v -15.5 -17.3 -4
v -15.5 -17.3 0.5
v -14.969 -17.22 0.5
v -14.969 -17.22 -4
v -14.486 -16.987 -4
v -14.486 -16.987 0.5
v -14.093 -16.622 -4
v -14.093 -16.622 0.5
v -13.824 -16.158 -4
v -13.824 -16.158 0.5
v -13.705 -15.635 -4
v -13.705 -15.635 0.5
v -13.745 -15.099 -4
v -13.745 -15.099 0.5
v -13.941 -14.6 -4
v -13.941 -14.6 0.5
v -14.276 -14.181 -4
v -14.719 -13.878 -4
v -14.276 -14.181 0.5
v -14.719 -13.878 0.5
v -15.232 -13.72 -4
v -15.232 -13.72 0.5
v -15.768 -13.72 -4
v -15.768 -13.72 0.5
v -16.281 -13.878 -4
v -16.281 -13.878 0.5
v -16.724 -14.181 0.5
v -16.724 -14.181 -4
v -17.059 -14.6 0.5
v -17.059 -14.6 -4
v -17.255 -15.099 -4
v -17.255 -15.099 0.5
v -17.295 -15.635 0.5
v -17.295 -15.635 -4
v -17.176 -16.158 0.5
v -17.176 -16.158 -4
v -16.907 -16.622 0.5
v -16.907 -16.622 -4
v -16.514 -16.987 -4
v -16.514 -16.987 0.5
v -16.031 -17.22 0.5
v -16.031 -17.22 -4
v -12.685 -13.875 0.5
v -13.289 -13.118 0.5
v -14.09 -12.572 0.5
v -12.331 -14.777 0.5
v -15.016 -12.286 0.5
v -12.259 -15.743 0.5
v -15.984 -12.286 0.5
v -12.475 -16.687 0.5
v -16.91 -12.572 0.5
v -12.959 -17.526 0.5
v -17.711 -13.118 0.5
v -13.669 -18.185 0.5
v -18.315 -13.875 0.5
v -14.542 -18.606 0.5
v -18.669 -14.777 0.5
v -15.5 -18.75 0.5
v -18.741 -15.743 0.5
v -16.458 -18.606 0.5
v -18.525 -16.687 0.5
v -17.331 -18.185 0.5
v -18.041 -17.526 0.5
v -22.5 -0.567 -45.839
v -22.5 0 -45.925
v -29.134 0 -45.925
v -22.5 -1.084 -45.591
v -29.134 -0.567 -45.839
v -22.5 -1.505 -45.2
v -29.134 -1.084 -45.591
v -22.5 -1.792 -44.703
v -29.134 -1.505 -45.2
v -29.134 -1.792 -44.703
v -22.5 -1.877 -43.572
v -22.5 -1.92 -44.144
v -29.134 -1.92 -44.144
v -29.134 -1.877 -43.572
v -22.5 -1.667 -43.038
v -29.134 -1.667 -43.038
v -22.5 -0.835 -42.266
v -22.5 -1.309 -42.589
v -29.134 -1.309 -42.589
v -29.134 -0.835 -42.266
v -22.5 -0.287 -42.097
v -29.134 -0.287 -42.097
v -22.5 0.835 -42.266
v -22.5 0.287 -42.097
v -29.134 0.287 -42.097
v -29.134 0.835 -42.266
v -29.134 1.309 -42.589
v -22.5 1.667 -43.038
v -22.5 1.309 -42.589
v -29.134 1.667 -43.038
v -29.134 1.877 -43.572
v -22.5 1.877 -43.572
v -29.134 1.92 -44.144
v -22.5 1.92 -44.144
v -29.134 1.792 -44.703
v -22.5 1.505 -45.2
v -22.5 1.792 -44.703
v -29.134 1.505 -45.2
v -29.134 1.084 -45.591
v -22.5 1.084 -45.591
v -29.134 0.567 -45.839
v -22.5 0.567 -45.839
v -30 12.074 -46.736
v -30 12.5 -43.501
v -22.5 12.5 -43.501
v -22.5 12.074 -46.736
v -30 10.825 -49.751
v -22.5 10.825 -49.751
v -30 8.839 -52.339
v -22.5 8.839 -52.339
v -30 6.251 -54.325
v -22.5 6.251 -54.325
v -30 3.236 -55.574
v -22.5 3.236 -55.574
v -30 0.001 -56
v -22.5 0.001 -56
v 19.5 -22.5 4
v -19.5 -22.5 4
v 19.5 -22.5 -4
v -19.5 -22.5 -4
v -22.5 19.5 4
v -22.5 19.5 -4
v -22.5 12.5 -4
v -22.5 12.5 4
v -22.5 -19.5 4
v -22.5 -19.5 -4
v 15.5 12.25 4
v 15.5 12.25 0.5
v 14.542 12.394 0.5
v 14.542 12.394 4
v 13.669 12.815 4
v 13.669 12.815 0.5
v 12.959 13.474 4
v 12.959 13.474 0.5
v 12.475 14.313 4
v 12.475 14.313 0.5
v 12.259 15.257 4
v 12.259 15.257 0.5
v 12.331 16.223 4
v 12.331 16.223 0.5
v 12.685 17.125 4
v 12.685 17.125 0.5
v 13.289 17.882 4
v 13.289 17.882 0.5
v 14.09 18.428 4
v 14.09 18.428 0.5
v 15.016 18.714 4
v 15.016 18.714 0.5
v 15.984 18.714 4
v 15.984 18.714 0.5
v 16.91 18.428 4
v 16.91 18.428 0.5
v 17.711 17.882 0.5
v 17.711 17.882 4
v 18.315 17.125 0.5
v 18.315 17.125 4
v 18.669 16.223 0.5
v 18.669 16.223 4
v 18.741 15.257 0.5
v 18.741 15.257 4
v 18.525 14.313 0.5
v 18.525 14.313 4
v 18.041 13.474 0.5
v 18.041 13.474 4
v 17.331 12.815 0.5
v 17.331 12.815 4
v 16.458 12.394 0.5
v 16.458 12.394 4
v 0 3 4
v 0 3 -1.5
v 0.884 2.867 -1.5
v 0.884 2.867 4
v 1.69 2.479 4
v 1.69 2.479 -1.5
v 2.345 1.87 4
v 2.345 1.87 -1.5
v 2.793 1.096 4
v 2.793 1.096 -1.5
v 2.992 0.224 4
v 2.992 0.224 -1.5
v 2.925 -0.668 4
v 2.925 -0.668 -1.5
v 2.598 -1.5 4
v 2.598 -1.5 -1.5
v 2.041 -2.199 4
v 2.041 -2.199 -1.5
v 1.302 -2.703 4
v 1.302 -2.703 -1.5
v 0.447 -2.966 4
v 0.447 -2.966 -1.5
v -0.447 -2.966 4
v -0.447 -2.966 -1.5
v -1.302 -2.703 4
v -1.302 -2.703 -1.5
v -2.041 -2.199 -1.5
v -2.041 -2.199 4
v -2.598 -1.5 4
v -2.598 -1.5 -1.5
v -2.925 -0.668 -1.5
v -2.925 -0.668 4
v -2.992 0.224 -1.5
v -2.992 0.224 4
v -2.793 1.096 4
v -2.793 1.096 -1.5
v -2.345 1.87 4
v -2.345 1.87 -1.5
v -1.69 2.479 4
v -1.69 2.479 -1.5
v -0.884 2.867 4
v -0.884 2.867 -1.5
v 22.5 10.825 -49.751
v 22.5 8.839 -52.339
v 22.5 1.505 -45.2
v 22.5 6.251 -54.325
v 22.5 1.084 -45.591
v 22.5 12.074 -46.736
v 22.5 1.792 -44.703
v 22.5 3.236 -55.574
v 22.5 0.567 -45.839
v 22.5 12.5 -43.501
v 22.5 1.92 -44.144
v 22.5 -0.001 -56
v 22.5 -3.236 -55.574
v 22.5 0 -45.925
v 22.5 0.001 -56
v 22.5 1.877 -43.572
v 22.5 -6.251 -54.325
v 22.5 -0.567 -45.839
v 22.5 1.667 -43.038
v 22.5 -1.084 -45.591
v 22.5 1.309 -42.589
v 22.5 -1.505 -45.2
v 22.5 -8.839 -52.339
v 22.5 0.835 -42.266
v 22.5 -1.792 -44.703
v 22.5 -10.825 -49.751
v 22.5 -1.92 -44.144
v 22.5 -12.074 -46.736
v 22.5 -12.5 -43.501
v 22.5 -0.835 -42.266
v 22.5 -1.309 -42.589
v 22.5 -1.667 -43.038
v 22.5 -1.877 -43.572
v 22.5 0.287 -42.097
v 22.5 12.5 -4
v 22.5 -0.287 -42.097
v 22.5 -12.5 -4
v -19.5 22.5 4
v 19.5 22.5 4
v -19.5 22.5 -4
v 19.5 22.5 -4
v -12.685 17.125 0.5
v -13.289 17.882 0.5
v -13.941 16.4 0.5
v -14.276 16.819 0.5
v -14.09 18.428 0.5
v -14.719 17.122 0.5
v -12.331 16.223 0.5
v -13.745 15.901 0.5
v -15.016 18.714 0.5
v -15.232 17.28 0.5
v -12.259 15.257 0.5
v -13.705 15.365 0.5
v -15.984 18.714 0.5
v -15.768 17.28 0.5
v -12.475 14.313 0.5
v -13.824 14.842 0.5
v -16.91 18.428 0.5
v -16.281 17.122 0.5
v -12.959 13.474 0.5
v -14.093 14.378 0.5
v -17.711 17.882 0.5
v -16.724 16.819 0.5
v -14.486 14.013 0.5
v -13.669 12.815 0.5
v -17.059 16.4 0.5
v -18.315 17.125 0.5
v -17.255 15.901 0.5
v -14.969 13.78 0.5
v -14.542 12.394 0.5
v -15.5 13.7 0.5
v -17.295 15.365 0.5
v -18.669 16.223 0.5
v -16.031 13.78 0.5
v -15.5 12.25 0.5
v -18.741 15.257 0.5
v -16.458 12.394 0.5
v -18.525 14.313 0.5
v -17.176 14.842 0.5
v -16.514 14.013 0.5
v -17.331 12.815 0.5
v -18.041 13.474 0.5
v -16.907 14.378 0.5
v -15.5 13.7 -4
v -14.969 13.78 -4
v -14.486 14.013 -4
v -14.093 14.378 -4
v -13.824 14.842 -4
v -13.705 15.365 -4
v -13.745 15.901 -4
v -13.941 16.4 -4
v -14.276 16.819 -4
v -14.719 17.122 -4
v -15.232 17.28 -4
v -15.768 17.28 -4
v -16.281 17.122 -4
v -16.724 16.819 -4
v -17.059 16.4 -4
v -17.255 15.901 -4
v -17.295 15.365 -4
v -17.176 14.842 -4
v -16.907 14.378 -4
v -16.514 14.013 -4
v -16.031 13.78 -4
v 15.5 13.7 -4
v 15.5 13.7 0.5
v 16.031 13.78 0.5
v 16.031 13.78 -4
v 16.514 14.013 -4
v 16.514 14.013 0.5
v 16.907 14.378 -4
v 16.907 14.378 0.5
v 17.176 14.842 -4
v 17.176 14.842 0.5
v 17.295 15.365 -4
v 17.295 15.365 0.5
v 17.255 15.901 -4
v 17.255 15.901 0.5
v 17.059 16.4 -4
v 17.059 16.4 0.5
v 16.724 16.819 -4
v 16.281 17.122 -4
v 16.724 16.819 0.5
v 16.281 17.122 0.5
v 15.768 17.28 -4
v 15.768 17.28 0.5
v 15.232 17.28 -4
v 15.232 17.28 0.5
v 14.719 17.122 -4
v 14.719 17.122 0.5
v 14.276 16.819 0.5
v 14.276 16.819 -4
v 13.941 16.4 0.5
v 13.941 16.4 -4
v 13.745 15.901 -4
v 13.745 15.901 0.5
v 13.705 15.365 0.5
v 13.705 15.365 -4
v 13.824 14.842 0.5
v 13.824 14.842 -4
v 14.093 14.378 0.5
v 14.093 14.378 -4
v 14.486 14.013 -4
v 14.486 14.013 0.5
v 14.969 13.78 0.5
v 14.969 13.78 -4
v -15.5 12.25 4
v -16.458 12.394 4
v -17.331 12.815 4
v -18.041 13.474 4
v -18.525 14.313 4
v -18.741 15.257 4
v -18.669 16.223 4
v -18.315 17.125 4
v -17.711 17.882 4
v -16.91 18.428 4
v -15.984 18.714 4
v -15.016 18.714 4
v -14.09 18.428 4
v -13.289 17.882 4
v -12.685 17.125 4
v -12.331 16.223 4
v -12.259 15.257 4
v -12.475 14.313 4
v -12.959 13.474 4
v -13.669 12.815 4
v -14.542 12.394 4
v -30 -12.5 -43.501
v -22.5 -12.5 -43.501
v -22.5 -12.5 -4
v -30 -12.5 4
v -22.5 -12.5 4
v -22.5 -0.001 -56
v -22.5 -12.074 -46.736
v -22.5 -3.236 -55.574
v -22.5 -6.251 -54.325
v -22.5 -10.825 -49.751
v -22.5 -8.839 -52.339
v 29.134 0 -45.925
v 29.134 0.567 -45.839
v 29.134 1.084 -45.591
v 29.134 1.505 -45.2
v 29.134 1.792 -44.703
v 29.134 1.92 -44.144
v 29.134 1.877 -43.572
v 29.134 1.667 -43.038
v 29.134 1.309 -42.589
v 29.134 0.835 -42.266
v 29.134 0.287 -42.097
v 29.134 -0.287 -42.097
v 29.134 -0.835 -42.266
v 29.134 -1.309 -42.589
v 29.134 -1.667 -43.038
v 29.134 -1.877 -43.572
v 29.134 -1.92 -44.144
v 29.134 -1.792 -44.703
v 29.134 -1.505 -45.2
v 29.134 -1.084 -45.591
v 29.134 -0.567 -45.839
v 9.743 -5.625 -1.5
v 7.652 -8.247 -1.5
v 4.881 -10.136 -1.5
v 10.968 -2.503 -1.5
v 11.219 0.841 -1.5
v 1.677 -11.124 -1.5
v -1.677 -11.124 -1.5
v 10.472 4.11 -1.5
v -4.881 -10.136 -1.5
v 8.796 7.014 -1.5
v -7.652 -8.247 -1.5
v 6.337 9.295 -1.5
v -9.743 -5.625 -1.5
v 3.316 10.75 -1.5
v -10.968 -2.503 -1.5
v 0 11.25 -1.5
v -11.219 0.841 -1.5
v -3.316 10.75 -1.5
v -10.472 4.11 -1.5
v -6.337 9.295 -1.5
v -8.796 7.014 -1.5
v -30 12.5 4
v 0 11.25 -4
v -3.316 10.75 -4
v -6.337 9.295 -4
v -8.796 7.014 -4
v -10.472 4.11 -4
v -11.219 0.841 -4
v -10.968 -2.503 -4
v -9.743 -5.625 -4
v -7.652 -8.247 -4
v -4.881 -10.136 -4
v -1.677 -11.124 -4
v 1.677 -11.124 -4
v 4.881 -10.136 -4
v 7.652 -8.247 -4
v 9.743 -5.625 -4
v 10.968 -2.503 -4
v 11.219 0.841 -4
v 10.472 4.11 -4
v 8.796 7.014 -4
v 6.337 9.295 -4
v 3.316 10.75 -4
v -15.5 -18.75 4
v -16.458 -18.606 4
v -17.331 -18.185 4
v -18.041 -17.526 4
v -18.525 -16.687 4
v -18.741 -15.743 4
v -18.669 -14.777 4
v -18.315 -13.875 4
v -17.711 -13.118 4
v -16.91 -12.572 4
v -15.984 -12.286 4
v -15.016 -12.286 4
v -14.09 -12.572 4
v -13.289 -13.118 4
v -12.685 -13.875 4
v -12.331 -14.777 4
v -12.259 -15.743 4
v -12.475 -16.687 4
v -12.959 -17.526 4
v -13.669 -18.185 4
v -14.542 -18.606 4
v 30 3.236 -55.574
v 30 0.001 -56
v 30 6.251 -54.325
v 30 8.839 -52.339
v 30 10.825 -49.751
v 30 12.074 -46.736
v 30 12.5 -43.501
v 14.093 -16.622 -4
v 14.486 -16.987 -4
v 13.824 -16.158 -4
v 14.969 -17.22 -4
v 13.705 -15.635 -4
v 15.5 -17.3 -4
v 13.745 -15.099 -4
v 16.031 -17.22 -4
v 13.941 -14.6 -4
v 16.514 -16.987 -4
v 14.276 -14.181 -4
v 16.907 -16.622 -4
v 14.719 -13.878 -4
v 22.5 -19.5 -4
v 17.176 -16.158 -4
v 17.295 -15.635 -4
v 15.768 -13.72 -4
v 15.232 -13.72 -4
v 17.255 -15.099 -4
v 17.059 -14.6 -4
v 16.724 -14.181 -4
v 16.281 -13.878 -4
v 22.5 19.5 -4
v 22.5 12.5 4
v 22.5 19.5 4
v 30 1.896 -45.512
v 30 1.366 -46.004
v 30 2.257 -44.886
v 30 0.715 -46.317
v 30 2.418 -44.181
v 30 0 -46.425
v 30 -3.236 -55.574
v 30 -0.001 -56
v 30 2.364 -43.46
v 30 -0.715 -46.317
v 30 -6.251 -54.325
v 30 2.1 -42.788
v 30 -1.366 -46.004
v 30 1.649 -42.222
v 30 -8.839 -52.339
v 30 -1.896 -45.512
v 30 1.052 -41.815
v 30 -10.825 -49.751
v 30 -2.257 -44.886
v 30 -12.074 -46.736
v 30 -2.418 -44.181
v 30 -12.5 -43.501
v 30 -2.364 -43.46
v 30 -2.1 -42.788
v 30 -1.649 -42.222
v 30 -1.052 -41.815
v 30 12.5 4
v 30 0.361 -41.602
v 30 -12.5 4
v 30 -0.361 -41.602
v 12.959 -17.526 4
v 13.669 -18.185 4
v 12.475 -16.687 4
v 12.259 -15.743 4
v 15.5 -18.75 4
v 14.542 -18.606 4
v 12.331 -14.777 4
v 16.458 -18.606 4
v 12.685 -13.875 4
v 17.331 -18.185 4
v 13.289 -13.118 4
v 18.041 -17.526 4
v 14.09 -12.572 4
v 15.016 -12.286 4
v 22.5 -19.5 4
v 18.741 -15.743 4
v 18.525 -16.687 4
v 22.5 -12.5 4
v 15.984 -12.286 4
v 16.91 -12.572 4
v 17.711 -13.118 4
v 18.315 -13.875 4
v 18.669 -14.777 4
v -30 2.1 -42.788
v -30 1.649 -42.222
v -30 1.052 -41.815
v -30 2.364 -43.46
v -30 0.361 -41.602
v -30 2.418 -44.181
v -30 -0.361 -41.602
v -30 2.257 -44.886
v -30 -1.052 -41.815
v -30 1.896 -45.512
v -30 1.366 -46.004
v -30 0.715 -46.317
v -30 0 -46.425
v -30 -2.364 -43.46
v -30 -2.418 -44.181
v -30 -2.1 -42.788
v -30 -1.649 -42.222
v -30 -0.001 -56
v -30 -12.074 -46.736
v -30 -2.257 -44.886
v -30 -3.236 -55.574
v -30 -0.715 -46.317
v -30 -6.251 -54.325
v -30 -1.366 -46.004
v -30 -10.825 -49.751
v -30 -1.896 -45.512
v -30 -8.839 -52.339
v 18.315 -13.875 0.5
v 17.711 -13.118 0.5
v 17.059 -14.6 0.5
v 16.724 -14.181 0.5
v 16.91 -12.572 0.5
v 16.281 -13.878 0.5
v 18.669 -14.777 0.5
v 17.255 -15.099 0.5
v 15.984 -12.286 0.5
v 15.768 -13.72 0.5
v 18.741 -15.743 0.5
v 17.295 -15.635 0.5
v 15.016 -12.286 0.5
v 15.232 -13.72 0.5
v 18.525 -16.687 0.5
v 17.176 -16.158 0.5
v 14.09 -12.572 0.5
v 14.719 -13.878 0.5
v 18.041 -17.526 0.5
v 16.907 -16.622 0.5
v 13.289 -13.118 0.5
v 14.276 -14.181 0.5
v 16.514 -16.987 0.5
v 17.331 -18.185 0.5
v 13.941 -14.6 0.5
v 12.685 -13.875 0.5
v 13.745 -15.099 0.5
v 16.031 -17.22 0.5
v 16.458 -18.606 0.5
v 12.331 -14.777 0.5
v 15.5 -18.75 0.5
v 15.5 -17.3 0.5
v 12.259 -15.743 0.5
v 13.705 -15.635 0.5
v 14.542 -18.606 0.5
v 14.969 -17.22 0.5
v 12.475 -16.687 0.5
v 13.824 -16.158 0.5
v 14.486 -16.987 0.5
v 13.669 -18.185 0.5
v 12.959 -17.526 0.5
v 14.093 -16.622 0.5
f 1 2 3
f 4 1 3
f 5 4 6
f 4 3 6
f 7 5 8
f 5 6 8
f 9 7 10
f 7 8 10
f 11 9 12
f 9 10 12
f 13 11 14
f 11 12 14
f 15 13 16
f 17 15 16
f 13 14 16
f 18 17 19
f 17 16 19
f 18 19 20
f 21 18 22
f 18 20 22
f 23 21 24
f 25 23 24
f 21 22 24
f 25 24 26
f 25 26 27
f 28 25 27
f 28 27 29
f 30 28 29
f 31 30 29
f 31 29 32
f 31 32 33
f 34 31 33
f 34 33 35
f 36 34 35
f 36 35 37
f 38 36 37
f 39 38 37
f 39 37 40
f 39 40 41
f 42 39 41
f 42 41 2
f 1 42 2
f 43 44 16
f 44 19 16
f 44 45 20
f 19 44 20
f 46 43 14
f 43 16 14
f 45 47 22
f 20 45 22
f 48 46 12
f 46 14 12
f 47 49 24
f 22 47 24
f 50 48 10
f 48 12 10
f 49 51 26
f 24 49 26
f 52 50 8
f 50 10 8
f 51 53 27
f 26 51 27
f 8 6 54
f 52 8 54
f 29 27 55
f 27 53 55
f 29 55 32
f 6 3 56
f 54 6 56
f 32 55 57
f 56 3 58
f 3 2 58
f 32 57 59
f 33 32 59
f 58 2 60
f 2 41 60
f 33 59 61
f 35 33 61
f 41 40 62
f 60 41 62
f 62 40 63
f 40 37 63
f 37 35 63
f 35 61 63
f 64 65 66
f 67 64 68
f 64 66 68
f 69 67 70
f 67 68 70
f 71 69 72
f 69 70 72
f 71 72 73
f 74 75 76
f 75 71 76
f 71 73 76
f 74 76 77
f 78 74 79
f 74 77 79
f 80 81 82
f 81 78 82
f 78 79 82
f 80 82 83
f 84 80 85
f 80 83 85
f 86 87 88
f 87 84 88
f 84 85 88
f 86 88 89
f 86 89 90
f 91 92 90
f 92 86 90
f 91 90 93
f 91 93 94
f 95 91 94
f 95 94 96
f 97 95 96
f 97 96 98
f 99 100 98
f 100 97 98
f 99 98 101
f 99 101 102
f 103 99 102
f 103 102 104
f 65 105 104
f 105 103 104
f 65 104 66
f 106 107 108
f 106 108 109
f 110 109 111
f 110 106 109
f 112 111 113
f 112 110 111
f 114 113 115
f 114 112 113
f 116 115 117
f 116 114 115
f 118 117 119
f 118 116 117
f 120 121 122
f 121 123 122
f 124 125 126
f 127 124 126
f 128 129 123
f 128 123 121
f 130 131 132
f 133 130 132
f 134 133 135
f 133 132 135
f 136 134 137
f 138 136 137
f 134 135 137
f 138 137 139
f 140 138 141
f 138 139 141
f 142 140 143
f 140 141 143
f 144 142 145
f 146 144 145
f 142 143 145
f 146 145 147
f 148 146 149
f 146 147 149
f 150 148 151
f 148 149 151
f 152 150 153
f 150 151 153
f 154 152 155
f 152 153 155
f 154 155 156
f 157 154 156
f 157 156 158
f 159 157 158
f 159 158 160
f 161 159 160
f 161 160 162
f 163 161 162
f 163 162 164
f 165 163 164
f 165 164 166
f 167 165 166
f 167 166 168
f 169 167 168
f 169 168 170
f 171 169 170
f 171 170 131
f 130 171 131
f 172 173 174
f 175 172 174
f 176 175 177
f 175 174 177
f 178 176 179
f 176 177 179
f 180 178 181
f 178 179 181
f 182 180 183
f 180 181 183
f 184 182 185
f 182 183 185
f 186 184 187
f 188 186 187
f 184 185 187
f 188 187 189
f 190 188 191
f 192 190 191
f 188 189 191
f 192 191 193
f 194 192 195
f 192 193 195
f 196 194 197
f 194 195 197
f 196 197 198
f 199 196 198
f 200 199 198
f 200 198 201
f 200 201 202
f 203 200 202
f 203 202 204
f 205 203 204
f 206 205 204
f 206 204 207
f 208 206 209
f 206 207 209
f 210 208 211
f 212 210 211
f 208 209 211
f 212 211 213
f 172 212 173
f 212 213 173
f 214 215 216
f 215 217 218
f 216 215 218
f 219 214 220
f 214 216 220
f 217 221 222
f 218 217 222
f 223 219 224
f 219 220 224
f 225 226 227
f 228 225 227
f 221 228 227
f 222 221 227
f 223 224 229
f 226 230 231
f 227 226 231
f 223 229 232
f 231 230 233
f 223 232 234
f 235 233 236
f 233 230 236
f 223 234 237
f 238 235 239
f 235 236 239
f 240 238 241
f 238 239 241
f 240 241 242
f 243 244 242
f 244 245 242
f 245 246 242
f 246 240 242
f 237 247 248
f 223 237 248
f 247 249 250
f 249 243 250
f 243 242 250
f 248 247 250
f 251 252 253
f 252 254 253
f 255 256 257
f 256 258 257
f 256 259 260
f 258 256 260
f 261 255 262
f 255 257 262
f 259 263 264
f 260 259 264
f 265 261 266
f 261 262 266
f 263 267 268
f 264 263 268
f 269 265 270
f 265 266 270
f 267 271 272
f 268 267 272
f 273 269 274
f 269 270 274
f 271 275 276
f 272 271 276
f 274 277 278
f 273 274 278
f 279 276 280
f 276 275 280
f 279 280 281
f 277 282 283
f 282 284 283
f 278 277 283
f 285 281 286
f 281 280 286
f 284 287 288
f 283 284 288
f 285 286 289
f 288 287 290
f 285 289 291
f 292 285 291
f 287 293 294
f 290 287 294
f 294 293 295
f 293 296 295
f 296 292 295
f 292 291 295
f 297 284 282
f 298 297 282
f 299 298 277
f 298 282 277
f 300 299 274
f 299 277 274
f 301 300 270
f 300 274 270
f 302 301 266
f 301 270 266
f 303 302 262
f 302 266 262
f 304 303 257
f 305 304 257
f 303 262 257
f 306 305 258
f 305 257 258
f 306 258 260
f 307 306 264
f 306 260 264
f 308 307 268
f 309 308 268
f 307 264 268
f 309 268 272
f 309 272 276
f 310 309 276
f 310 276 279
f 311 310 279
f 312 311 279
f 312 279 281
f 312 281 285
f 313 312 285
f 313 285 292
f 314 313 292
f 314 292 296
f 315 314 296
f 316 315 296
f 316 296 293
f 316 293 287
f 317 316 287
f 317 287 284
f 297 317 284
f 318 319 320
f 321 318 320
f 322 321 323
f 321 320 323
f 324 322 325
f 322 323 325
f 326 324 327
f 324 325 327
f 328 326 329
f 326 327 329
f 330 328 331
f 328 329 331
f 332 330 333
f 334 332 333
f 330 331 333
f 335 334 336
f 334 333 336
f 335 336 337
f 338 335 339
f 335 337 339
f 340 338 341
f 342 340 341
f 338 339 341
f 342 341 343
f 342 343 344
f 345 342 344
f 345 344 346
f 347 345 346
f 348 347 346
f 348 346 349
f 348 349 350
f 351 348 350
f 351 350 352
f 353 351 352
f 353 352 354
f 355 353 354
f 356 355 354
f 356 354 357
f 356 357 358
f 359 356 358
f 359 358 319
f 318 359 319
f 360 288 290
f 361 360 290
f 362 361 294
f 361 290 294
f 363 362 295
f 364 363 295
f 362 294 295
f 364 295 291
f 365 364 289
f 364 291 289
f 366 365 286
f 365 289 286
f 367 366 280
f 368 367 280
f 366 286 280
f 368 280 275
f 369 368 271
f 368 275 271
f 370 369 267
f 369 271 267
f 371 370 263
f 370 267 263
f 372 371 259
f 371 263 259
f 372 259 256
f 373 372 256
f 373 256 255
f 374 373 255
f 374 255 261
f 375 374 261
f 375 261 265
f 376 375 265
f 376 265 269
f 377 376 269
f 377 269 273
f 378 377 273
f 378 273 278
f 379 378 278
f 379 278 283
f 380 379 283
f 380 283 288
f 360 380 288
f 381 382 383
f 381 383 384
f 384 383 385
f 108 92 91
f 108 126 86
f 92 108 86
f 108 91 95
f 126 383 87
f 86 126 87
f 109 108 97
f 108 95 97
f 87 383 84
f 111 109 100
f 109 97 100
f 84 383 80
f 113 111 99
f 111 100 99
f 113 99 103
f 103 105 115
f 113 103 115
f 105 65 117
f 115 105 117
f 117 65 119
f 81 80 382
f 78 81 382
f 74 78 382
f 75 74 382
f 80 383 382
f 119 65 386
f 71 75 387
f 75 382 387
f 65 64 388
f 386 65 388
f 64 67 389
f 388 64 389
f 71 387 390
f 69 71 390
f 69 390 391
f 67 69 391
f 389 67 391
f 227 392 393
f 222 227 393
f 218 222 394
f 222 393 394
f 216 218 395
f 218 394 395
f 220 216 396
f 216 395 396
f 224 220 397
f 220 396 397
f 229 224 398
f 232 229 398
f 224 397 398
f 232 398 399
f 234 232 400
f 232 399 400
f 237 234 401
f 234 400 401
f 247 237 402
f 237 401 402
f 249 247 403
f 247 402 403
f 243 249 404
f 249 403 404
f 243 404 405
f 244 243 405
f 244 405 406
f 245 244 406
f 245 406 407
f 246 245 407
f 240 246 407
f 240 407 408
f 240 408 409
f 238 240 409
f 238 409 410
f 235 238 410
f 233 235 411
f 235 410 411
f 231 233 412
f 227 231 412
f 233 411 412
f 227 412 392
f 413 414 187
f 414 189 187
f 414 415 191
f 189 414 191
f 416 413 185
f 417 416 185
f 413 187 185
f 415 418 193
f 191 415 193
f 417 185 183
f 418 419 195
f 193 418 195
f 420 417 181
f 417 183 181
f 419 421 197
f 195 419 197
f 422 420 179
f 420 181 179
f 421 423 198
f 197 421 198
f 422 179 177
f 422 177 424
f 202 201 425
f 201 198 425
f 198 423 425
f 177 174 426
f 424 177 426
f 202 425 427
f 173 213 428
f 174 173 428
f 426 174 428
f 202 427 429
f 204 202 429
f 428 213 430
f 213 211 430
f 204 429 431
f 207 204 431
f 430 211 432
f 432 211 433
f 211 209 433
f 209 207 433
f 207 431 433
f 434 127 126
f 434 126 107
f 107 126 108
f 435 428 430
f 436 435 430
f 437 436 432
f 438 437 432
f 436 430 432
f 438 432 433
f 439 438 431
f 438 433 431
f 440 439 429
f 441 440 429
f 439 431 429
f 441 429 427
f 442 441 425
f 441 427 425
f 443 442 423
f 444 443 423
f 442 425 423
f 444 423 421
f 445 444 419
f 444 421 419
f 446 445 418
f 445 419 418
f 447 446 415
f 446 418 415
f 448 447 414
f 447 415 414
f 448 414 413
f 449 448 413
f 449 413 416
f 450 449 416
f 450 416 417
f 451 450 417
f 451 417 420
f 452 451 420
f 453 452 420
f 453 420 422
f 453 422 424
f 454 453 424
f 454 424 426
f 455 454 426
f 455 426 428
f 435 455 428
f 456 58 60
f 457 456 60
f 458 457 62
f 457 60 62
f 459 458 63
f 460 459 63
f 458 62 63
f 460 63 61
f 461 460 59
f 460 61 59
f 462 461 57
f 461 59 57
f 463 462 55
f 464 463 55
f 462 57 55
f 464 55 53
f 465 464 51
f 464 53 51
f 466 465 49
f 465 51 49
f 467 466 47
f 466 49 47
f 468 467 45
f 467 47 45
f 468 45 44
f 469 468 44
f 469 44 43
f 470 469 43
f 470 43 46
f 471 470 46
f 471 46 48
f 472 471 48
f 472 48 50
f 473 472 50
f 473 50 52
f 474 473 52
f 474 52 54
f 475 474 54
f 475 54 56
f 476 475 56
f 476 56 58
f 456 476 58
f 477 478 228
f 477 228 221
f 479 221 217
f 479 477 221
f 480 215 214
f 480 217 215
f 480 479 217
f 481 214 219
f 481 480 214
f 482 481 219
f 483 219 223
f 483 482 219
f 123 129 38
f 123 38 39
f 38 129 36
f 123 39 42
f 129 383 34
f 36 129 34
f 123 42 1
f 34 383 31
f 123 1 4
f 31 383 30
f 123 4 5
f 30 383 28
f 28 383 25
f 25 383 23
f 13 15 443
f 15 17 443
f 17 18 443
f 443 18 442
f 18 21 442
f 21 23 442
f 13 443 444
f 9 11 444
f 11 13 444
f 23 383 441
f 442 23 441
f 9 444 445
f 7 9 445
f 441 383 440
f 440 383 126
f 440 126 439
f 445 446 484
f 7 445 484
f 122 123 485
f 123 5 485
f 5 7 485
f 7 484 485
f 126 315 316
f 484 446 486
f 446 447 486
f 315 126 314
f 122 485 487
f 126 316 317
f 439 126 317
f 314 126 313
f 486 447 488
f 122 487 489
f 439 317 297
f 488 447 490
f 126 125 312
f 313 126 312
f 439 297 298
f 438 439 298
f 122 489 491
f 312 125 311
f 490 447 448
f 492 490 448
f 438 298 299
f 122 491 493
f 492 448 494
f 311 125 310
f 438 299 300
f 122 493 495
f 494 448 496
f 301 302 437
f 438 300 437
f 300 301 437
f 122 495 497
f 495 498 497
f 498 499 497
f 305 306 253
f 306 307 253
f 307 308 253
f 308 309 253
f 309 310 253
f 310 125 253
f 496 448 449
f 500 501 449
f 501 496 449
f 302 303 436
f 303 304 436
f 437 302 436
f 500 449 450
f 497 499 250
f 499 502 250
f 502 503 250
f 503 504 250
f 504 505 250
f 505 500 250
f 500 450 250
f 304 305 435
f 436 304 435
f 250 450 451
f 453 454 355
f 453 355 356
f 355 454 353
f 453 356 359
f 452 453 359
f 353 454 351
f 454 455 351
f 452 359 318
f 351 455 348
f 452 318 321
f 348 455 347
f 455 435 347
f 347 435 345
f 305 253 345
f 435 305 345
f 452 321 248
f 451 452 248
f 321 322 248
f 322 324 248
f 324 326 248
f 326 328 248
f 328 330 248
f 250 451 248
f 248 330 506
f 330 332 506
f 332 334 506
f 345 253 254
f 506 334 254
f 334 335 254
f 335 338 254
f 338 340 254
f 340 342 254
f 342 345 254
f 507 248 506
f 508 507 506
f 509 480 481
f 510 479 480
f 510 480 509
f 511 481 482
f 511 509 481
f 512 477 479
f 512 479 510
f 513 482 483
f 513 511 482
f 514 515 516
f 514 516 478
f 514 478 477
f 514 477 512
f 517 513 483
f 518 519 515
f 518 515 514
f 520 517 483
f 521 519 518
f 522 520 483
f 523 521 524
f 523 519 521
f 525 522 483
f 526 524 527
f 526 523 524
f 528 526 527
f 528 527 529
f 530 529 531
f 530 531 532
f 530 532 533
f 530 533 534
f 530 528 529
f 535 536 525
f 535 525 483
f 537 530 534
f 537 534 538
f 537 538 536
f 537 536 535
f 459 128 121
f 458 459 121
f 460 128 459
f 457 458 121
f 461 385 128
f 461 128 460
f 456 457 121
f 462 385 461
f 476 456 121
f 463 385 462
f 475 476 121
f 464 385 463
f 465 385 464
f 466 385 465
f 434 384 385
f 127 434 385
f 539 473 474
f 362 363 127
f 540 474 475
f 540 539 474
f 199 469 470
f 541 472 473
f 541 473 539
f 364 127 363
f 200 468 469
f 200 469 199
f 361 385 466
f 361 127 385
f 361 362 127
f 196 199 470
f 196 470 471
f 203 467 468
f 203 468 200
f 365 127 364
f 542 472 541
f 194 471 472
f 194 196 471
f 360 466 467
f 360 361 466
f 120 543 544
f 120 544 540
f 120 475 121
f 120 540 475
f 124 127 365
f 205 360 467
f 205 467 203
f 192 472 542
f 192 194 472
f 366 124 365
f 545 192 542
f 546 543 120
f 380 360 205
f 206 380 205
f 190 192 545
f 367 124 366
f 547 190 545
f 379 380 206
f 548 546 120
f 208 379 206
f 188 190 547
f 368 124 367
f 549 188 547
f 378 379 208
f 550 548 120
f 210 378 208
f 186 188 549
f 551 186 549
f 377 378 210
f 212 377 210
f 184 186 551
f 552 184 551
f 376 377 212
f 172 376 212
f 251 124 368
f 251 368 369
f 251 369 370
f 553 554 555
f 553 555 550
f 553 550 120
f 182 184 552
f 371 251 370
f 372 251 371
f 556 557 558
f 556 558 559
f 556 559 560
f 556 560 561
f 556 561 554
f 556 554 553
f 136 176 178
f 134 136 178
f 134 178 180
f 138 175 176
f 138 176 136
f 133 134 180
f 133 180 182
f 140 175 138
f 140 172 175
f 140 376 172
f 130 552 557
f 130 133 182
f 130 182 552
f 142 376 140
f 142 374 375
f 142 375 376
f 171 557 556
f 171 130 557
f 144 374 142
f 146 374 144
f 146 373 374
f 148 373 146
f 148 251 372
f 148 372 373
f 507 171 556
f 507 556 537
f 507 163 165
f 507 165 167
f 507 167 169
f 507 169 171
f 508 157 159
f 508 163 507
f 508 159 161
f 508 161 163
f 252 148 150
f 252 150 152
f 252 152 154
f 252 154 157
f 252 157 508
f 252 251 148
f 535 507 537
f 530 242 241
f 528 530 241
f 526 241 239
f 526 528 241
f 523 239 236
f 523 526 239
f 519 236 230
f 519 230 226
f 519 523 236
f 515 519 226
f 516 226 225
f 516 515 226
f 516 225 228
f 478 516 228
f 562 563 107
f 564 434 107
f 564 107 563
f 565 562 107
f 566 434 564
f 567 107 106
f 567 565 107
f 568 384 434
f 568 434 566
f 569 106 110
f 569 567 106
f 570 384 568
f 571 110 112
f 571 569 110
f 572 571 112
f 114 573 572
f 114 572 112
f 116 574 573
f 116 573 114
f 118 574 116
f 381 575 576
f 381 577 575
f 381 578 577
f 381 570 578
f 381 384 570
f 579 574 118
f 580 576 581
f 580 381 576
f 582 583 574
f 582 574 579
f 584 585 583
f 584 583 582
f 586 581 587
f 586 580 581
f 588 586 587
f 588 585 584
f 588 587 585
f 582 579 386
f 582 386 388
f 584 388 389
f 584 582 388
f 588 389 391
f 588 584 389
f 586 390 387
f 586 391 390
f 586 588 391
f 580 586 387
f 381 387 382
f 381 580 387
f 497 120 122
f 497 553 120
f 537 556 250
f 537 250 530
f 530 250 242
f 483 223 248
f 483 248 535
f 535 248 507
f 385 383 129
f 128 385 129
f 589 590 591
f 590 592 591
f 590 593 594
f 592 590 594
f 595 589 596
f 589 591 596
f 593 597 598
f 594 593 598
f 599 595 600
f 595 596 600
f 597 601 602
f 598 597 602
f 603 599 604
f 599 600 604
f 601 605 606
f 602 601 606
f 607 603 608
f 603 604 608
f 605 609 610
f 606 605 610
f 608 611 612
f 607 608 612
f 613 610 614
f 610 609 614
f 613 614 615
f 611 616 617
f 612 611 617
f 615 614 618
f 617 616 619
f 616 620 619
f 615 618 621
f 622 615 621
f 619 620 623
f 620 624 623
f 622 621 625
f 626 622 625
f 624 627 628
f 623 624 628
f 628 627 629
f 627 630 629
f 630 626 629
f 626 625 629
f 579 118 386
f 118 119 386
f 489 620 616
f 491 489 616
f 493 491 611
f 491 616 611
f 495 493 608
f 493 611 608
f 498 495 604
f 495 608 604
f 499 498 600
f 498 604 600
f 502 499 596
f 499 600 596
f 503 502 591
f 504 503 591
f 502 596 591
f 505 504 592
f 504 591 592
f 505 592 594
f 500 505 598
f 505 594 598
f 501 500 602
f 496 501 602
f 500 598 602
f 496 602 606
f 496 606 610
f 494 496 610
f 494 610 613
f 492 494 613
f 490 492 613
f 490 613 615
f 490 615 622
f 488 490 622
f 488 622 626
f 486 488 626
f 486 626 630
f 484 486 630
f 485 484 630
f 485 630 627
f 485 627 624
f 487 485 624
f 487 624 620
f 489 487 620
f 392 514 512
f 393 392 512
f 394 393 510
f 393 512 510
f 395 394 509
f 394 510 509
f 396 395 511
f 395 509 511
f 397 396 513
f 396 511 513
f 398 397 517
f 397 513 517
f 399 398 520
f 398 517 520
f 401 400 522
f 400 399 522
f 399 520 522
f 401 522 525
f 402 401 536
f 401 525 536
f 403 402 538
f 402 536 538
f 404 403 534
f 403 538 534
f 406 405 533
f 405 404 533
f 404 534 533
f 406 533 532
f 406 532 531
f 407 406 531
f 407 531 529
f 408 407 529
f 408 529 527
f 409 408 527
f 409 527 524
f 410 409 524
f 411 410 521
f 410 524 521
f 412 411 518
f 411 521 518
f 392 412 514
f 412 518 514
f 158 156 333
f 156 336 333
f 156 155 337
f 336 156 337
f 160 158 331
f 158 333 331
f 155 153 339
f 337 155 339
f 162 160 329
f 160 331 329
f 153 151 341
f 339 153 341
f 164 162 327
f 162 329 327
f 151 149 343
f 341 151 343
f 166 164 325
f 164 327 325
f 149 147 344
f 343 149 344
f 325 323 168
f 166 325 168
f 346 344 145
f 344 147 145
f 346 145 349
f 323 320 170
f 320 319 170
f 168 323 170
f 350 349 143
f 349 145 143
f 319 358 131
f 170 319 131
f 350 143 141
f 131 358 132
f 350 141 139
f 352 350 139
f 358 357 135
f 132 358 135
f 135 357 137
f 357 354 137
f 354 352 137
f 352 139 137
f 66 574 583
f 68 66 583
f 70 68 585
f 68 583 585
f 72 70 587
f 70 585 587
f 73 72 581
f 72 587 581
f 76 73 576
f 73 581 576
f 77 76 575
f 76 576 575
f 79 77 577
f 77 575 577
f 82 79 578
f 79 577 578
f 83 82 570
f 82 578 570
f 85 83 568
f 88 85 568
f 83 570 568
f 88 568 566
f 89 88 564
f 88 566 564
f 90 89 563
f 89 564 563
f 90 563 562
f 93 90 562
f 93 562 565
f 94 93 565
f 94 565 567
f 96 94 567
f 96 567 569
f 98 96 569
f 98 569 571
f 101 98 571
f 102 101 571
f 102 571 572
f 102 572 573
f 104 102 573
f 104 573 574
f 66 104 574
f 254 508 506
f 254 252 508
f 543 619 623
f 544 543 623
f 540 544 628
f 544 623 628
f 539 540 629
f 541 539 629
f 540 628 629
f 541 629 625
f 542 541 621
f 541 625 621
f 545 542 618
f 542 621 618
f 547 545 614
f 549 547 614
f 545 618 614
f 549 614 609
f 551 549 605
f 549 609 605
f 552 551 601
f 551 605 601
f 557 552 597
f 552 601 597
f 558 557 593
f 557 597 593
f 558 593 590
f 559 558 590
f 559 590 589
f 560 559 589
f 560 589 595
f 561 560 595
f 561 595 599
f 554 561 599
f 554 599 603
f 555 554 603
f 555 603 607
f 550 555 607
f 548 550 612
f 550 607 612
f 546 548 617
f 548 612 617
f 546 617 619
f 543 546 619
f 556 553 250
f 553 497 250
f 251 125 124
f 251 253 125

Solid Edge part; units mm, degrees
sketch "Sketch1" plane through (0, 0, 0) normal (0, 0, 1) x (1, 0, 0)
  line L0 (-22.5, -22.5) -> (22.5, -22.5)
  line L1 (22.5, -22.5) -> (22.5, 22.5)
  line L2 (22.5, 22.5) -> (-22.5, 22.5)
  line L3 (-22.5, 22.5) -> (-22.5, -22.5)
  dimension "D1" = 45
extrude "Protrusion1" add sketch "Sketch1" along normal mid plane 8
hole "Hole_1" at (-15.5, 15.5, 4) direction (0, 0, -1) diameter 3.6 end up to next counterbore diameter 6.5 counterbore depth 3.5
hole "Hole1" at (15.5, 15.5, 4) direction (0, 0, -1) diameter 3.6 end up to next counterbore diameter 6.5 counterbore depth 3.5
hole "Hole2" at (-15.5, -15.5, 4) direction (0, 0, -1) diameter 3.6 end up to next counterbore diameter 6.5 counterbore depth 3.5
hole "Hole3" at (15.5, -15.5, 4) direction (0, 0, -1) diameter 3.6 end up to next counterbore diameter 6.5 counterbore depth 3.5
chamfer "Chamfer_1" distance 3 angle 45 4 edges at (-22.5, -22.5, 0) (-22.5, 22.5, 0) (22.5, 22.5, 0) (22.5, -22.5, 0)
hole "Hole_5" at (0, 0, -4) direction (0, 0, 1) diameter 6 end up to next counterbore diameter 22.5 counterbore depth 2.5
sketch "Sketch2" plane through (22.5, 0, 0) normal (1, 0, 0) x (0, -1, 0)
  line L0 (-12.5, -4) -> (12.5, -4)
  line L1 (12.5, -4) -> (12.5, 56)
  line L2 (12.5, 56) -> (-12.5, 56)
  line L3 (-12.5, 56) -> (-12.5, -4)
  dimension "D1" = 60
  dimension "D2" = 25
extrude "ExtrudedProtrusion_2" add sketch "Sketch2" along normal blind 7.5
hole "Hole_6" at (30, 0, -44) direction (-1, 0, 0) diameter 3.85 end up to next
fillet "Round_1" radius 12.5 2 edges at (26.25, -12.5, -56) (26.25, 12.5, -56)
mirror "Mirror1" about plane through (0, 0, 0) normal (1, 0, 0) of "ExtrudedProtrusion_2", "Hole_6"
fillet "Round1" radius 12.5 2 edges at (-26.25, -12.5, -56) (-26.25, 12.5, -56)
chamfer "Chamfer_2" distance 0.5 angle 60 2 edges at (-30, 1.925, -44) (30, 1.925, -44) measured on face at (30, 8.0833, -46.6) measured on face at (-30, 8.0833, -46.6)
properties material "Polyethylene, low density"
